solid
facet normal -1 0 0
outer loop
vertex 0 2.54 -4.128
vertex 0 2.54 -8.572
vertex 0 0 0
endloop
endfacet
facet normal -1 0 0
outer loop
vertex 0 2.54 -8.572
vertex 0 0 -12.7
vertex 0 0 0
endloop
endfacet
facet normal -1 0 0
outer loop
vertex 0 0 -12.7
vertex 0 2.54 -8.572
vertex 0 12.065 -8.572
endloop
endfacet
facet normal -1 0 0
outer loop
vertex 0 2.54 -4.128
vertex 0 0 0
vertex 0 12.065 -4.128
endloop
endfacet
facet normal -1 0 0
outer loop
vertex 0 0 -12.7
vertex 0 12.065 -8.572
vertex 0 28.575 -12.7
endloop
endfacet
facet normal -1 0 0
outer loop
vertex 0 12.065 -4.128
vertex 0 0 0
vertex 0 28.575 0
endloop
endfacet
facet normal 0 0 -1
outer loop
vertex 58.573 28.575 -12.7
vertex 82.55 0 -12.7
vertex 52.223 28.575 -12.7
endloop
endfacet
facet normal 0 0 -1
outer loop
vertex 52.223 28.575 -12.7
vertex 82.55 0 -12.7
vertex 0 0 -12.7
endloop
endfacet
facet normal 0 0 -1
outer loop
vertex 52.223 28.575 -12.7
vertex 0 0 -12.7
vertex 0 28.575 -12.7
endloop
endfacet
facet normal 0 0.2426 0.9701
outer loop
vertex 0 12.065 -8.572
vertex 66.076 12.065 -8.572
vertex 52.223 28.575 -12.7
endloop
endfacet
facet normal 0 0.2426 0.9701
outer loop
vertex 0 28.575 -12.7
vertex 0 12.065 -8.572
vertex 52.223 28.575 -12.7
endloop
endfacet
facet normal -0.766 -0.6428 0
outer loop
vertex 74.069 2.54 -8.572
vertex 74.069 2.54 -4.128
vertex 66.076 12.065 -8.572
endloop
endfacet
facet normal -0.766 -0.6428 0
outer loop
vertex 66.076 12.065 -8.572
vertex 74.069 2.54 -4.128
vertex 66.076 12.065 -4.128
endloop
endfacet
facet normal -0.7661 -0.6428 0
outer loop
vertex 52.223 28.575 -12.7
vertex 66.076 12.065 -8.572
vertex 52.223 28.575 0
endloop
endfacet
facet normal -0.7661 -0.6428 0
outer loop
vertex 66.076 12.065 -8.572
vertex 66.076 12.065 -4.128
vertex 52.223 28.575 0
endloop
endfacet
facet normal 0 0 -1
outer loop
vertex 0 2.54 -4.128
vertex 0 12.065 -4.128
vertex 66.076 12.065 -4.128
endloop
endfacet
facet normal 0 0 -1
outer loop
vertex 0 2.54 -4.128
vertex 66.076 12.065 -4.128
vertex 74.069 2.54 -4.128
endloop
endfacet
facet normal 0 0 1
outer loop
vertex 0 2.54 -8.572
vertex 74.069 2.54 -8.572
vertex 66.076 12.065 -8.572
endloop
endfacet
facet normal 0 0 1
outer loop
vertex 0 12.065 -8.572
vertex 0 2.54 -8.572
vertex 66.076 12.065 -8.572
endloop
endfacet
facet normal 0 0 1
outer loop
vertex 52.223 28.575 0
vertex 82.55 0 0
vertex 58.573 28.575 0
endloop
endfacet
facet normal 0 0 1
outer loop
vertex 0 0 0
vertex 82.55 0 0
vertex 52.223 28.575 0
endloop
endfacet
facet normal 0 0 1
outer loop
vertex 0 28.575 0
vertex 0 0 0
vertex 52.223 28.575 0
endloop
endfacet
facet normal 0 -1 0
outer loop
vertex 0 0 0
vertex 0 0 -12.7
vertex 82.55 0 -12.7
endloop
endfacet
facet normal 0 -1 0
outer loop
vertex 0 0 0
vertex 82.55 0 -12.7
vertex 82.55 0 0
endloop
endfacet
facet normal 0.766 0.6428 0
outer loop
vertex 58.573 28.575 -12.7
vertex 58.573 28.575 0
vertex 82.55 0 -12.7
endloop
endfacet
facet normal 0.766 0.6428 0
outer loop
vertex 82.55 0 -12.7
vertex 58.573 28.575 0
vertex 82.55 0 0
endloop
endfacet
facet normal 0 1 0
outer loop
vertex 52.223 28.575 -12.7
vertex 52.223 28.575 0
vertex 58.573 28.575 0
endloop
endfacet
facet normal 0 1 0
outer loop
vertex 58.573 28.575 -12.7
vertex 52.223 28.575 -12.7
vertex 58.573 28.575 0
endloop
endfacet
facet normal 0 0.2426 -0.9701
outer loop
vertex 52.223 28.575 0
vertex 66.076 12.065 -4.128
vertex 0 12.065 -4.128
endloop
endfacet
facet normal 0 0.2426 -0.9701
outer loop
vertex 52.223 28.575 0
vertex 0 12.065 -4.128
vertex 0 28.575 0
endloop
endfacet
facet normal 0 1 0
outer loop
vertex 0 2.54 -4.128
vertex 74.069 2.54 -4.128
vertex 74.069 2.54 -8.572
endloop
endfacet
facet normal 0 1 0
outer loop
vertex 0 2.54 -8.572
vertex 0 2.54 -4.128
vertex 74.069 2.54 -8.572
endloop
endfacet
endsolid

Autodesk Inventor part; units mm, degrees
ref_plane "YZ Plane" through (0, 0, 0) normal (1, 0, 0) x (0, 1, 0)
ref_plane "XZ Plane" through (0, 0, 0) normal (0, 1, 0) x (-1, 0, 0)
ref_plane "XY Plane" through (0, 0, 0) normal (0, 0, 1) x (1, 0, 0)
sketch "Sketch1" plane through (0, 0, 0) normal (1, 0, 0) x (0, 1, 0)
  line L0 (0, 0) -> (3.175, 0)
  line L1 (3.175, -12.7) -> (0, -12.7)
  line L2 (0, -12.7) -> (0, 0)
  line L3 (3.175, 0) -> (28.575, 0)
  line L4 (3.175, -12.7) -> (28.575, -12.7)
  line L5 (12.065, -4.1275) -> (28.575, 0)
  line L6 (12.065, -8.5725) -> (28.575, -12.7)
  line L7 (12.065, -4.1275) -> (3.175, -4.1275)
  line L8 (12.065, -8.5725) -> (3.175, -8.5725)
  line L9 (3.175, -4.1275) -> (2.54, -4.1275)
  line L10 (2.54, -4.1275) -> (2.54, -8.5725)
  line L11 (2.54, -8.5725) -> (3.175, -8.5725)
  dimension "d0" = 3.175
  dimension "d1" = 12.7
  dimension "d2" = 25.4
  dimension "d3" = 0.635
extrude "Extrusion1" add sketch "Sketch1" along normal blind 88.9
sketch "Sketch2" plane through (0, 0, 0) normal (0, 0, 1) x (1, 0, 0)
  line L0 (70.7723, 45.5937) -> (70.7723, 36.3388)
  line L1 (0, 12.065) -> (88.9, 12.065) projected
  line L2 (70.7723, 36.3388) -> (70.7723, 45.5937)
  line L3 (70.7723, 45.5937) -> (88.9, 45.5937)
  line L4 (88.9, 45.5937) -> (70.7723, 45.5937)
  line L5 (70.7723, 45.5937) -> (79.5643, 35.1158)
  line L6 (88.9, 12.065) -> (88.9, 28.575) projected
  line L7 (88.9, 28.575) -> (57.2257, 28.575)
  line L8 (0, 28.575) -> (88.9, 28.575) projected
  line L9 (88.9, 0) -> (76.2, 0)
  line L10 (0, 0) -> (88.9, 0) projected
  line L11 (76.2, 0) -> (52.2227, 28.575)
  line L12 (52.2227, 28.575) -> (52.2227, 24.9497)
  line L13 (0, 28.575) -> (0, 0) projected
  line L14 (0, 0) -> (88.9, 0) projected
  line L15 (88.9, 28.575) -> (88.9, 0) projected
  line L16 (0, 28.575) -> (88.9, 28.575) projected
  dimension "d6" = 40
  dimension "d8" = 12.7
  dimension "d9" = 40
extrude "Extrusion2" add sketch "Sketch2" against normal blind 12.7 contours L11 L8 L7 L6 L1 | L1 L15 L9 L11
sketch "Sketch3" plane through (0, 0, 0) normal (0, 0, 1) x (1, 0, 0)
  line L0 (0, 28.575) -> (52.2227, 28.575) projected
  line L1 (52.2227, 28.575) -> (58.5727, 28.575)
  line L2 (52.2227, 28.575) -> (88.9, 28.575) projected
  line L3 (52.2227, 28.575) -> (66.0763, 12.065) projected
  line L4 (58.5727, 28.575) -> (89.629, -8.4365)
  line L5 (58.5727, 28.575) -> (106.8878, 28.575) construction
  line L6 (89.629, -8.4365) -> (99.364, 12.7806)
  line L7 (99.364, 12.7806) -> (87.0878, 39.7231)
  line L8 (87.0878, 39.7231) -> (61.7749, 33.0961)
  line L9 (61.7749, 33.0961) -> (58.5727, 28.575)
  point P0 (0, 0)
  dimension "d12" = 6.35
  dimension "d13" = 50
extrude "Extrusion3" cut sketch "Sketch3" against normal blind 12.7
properties part number "edge holder tip"
